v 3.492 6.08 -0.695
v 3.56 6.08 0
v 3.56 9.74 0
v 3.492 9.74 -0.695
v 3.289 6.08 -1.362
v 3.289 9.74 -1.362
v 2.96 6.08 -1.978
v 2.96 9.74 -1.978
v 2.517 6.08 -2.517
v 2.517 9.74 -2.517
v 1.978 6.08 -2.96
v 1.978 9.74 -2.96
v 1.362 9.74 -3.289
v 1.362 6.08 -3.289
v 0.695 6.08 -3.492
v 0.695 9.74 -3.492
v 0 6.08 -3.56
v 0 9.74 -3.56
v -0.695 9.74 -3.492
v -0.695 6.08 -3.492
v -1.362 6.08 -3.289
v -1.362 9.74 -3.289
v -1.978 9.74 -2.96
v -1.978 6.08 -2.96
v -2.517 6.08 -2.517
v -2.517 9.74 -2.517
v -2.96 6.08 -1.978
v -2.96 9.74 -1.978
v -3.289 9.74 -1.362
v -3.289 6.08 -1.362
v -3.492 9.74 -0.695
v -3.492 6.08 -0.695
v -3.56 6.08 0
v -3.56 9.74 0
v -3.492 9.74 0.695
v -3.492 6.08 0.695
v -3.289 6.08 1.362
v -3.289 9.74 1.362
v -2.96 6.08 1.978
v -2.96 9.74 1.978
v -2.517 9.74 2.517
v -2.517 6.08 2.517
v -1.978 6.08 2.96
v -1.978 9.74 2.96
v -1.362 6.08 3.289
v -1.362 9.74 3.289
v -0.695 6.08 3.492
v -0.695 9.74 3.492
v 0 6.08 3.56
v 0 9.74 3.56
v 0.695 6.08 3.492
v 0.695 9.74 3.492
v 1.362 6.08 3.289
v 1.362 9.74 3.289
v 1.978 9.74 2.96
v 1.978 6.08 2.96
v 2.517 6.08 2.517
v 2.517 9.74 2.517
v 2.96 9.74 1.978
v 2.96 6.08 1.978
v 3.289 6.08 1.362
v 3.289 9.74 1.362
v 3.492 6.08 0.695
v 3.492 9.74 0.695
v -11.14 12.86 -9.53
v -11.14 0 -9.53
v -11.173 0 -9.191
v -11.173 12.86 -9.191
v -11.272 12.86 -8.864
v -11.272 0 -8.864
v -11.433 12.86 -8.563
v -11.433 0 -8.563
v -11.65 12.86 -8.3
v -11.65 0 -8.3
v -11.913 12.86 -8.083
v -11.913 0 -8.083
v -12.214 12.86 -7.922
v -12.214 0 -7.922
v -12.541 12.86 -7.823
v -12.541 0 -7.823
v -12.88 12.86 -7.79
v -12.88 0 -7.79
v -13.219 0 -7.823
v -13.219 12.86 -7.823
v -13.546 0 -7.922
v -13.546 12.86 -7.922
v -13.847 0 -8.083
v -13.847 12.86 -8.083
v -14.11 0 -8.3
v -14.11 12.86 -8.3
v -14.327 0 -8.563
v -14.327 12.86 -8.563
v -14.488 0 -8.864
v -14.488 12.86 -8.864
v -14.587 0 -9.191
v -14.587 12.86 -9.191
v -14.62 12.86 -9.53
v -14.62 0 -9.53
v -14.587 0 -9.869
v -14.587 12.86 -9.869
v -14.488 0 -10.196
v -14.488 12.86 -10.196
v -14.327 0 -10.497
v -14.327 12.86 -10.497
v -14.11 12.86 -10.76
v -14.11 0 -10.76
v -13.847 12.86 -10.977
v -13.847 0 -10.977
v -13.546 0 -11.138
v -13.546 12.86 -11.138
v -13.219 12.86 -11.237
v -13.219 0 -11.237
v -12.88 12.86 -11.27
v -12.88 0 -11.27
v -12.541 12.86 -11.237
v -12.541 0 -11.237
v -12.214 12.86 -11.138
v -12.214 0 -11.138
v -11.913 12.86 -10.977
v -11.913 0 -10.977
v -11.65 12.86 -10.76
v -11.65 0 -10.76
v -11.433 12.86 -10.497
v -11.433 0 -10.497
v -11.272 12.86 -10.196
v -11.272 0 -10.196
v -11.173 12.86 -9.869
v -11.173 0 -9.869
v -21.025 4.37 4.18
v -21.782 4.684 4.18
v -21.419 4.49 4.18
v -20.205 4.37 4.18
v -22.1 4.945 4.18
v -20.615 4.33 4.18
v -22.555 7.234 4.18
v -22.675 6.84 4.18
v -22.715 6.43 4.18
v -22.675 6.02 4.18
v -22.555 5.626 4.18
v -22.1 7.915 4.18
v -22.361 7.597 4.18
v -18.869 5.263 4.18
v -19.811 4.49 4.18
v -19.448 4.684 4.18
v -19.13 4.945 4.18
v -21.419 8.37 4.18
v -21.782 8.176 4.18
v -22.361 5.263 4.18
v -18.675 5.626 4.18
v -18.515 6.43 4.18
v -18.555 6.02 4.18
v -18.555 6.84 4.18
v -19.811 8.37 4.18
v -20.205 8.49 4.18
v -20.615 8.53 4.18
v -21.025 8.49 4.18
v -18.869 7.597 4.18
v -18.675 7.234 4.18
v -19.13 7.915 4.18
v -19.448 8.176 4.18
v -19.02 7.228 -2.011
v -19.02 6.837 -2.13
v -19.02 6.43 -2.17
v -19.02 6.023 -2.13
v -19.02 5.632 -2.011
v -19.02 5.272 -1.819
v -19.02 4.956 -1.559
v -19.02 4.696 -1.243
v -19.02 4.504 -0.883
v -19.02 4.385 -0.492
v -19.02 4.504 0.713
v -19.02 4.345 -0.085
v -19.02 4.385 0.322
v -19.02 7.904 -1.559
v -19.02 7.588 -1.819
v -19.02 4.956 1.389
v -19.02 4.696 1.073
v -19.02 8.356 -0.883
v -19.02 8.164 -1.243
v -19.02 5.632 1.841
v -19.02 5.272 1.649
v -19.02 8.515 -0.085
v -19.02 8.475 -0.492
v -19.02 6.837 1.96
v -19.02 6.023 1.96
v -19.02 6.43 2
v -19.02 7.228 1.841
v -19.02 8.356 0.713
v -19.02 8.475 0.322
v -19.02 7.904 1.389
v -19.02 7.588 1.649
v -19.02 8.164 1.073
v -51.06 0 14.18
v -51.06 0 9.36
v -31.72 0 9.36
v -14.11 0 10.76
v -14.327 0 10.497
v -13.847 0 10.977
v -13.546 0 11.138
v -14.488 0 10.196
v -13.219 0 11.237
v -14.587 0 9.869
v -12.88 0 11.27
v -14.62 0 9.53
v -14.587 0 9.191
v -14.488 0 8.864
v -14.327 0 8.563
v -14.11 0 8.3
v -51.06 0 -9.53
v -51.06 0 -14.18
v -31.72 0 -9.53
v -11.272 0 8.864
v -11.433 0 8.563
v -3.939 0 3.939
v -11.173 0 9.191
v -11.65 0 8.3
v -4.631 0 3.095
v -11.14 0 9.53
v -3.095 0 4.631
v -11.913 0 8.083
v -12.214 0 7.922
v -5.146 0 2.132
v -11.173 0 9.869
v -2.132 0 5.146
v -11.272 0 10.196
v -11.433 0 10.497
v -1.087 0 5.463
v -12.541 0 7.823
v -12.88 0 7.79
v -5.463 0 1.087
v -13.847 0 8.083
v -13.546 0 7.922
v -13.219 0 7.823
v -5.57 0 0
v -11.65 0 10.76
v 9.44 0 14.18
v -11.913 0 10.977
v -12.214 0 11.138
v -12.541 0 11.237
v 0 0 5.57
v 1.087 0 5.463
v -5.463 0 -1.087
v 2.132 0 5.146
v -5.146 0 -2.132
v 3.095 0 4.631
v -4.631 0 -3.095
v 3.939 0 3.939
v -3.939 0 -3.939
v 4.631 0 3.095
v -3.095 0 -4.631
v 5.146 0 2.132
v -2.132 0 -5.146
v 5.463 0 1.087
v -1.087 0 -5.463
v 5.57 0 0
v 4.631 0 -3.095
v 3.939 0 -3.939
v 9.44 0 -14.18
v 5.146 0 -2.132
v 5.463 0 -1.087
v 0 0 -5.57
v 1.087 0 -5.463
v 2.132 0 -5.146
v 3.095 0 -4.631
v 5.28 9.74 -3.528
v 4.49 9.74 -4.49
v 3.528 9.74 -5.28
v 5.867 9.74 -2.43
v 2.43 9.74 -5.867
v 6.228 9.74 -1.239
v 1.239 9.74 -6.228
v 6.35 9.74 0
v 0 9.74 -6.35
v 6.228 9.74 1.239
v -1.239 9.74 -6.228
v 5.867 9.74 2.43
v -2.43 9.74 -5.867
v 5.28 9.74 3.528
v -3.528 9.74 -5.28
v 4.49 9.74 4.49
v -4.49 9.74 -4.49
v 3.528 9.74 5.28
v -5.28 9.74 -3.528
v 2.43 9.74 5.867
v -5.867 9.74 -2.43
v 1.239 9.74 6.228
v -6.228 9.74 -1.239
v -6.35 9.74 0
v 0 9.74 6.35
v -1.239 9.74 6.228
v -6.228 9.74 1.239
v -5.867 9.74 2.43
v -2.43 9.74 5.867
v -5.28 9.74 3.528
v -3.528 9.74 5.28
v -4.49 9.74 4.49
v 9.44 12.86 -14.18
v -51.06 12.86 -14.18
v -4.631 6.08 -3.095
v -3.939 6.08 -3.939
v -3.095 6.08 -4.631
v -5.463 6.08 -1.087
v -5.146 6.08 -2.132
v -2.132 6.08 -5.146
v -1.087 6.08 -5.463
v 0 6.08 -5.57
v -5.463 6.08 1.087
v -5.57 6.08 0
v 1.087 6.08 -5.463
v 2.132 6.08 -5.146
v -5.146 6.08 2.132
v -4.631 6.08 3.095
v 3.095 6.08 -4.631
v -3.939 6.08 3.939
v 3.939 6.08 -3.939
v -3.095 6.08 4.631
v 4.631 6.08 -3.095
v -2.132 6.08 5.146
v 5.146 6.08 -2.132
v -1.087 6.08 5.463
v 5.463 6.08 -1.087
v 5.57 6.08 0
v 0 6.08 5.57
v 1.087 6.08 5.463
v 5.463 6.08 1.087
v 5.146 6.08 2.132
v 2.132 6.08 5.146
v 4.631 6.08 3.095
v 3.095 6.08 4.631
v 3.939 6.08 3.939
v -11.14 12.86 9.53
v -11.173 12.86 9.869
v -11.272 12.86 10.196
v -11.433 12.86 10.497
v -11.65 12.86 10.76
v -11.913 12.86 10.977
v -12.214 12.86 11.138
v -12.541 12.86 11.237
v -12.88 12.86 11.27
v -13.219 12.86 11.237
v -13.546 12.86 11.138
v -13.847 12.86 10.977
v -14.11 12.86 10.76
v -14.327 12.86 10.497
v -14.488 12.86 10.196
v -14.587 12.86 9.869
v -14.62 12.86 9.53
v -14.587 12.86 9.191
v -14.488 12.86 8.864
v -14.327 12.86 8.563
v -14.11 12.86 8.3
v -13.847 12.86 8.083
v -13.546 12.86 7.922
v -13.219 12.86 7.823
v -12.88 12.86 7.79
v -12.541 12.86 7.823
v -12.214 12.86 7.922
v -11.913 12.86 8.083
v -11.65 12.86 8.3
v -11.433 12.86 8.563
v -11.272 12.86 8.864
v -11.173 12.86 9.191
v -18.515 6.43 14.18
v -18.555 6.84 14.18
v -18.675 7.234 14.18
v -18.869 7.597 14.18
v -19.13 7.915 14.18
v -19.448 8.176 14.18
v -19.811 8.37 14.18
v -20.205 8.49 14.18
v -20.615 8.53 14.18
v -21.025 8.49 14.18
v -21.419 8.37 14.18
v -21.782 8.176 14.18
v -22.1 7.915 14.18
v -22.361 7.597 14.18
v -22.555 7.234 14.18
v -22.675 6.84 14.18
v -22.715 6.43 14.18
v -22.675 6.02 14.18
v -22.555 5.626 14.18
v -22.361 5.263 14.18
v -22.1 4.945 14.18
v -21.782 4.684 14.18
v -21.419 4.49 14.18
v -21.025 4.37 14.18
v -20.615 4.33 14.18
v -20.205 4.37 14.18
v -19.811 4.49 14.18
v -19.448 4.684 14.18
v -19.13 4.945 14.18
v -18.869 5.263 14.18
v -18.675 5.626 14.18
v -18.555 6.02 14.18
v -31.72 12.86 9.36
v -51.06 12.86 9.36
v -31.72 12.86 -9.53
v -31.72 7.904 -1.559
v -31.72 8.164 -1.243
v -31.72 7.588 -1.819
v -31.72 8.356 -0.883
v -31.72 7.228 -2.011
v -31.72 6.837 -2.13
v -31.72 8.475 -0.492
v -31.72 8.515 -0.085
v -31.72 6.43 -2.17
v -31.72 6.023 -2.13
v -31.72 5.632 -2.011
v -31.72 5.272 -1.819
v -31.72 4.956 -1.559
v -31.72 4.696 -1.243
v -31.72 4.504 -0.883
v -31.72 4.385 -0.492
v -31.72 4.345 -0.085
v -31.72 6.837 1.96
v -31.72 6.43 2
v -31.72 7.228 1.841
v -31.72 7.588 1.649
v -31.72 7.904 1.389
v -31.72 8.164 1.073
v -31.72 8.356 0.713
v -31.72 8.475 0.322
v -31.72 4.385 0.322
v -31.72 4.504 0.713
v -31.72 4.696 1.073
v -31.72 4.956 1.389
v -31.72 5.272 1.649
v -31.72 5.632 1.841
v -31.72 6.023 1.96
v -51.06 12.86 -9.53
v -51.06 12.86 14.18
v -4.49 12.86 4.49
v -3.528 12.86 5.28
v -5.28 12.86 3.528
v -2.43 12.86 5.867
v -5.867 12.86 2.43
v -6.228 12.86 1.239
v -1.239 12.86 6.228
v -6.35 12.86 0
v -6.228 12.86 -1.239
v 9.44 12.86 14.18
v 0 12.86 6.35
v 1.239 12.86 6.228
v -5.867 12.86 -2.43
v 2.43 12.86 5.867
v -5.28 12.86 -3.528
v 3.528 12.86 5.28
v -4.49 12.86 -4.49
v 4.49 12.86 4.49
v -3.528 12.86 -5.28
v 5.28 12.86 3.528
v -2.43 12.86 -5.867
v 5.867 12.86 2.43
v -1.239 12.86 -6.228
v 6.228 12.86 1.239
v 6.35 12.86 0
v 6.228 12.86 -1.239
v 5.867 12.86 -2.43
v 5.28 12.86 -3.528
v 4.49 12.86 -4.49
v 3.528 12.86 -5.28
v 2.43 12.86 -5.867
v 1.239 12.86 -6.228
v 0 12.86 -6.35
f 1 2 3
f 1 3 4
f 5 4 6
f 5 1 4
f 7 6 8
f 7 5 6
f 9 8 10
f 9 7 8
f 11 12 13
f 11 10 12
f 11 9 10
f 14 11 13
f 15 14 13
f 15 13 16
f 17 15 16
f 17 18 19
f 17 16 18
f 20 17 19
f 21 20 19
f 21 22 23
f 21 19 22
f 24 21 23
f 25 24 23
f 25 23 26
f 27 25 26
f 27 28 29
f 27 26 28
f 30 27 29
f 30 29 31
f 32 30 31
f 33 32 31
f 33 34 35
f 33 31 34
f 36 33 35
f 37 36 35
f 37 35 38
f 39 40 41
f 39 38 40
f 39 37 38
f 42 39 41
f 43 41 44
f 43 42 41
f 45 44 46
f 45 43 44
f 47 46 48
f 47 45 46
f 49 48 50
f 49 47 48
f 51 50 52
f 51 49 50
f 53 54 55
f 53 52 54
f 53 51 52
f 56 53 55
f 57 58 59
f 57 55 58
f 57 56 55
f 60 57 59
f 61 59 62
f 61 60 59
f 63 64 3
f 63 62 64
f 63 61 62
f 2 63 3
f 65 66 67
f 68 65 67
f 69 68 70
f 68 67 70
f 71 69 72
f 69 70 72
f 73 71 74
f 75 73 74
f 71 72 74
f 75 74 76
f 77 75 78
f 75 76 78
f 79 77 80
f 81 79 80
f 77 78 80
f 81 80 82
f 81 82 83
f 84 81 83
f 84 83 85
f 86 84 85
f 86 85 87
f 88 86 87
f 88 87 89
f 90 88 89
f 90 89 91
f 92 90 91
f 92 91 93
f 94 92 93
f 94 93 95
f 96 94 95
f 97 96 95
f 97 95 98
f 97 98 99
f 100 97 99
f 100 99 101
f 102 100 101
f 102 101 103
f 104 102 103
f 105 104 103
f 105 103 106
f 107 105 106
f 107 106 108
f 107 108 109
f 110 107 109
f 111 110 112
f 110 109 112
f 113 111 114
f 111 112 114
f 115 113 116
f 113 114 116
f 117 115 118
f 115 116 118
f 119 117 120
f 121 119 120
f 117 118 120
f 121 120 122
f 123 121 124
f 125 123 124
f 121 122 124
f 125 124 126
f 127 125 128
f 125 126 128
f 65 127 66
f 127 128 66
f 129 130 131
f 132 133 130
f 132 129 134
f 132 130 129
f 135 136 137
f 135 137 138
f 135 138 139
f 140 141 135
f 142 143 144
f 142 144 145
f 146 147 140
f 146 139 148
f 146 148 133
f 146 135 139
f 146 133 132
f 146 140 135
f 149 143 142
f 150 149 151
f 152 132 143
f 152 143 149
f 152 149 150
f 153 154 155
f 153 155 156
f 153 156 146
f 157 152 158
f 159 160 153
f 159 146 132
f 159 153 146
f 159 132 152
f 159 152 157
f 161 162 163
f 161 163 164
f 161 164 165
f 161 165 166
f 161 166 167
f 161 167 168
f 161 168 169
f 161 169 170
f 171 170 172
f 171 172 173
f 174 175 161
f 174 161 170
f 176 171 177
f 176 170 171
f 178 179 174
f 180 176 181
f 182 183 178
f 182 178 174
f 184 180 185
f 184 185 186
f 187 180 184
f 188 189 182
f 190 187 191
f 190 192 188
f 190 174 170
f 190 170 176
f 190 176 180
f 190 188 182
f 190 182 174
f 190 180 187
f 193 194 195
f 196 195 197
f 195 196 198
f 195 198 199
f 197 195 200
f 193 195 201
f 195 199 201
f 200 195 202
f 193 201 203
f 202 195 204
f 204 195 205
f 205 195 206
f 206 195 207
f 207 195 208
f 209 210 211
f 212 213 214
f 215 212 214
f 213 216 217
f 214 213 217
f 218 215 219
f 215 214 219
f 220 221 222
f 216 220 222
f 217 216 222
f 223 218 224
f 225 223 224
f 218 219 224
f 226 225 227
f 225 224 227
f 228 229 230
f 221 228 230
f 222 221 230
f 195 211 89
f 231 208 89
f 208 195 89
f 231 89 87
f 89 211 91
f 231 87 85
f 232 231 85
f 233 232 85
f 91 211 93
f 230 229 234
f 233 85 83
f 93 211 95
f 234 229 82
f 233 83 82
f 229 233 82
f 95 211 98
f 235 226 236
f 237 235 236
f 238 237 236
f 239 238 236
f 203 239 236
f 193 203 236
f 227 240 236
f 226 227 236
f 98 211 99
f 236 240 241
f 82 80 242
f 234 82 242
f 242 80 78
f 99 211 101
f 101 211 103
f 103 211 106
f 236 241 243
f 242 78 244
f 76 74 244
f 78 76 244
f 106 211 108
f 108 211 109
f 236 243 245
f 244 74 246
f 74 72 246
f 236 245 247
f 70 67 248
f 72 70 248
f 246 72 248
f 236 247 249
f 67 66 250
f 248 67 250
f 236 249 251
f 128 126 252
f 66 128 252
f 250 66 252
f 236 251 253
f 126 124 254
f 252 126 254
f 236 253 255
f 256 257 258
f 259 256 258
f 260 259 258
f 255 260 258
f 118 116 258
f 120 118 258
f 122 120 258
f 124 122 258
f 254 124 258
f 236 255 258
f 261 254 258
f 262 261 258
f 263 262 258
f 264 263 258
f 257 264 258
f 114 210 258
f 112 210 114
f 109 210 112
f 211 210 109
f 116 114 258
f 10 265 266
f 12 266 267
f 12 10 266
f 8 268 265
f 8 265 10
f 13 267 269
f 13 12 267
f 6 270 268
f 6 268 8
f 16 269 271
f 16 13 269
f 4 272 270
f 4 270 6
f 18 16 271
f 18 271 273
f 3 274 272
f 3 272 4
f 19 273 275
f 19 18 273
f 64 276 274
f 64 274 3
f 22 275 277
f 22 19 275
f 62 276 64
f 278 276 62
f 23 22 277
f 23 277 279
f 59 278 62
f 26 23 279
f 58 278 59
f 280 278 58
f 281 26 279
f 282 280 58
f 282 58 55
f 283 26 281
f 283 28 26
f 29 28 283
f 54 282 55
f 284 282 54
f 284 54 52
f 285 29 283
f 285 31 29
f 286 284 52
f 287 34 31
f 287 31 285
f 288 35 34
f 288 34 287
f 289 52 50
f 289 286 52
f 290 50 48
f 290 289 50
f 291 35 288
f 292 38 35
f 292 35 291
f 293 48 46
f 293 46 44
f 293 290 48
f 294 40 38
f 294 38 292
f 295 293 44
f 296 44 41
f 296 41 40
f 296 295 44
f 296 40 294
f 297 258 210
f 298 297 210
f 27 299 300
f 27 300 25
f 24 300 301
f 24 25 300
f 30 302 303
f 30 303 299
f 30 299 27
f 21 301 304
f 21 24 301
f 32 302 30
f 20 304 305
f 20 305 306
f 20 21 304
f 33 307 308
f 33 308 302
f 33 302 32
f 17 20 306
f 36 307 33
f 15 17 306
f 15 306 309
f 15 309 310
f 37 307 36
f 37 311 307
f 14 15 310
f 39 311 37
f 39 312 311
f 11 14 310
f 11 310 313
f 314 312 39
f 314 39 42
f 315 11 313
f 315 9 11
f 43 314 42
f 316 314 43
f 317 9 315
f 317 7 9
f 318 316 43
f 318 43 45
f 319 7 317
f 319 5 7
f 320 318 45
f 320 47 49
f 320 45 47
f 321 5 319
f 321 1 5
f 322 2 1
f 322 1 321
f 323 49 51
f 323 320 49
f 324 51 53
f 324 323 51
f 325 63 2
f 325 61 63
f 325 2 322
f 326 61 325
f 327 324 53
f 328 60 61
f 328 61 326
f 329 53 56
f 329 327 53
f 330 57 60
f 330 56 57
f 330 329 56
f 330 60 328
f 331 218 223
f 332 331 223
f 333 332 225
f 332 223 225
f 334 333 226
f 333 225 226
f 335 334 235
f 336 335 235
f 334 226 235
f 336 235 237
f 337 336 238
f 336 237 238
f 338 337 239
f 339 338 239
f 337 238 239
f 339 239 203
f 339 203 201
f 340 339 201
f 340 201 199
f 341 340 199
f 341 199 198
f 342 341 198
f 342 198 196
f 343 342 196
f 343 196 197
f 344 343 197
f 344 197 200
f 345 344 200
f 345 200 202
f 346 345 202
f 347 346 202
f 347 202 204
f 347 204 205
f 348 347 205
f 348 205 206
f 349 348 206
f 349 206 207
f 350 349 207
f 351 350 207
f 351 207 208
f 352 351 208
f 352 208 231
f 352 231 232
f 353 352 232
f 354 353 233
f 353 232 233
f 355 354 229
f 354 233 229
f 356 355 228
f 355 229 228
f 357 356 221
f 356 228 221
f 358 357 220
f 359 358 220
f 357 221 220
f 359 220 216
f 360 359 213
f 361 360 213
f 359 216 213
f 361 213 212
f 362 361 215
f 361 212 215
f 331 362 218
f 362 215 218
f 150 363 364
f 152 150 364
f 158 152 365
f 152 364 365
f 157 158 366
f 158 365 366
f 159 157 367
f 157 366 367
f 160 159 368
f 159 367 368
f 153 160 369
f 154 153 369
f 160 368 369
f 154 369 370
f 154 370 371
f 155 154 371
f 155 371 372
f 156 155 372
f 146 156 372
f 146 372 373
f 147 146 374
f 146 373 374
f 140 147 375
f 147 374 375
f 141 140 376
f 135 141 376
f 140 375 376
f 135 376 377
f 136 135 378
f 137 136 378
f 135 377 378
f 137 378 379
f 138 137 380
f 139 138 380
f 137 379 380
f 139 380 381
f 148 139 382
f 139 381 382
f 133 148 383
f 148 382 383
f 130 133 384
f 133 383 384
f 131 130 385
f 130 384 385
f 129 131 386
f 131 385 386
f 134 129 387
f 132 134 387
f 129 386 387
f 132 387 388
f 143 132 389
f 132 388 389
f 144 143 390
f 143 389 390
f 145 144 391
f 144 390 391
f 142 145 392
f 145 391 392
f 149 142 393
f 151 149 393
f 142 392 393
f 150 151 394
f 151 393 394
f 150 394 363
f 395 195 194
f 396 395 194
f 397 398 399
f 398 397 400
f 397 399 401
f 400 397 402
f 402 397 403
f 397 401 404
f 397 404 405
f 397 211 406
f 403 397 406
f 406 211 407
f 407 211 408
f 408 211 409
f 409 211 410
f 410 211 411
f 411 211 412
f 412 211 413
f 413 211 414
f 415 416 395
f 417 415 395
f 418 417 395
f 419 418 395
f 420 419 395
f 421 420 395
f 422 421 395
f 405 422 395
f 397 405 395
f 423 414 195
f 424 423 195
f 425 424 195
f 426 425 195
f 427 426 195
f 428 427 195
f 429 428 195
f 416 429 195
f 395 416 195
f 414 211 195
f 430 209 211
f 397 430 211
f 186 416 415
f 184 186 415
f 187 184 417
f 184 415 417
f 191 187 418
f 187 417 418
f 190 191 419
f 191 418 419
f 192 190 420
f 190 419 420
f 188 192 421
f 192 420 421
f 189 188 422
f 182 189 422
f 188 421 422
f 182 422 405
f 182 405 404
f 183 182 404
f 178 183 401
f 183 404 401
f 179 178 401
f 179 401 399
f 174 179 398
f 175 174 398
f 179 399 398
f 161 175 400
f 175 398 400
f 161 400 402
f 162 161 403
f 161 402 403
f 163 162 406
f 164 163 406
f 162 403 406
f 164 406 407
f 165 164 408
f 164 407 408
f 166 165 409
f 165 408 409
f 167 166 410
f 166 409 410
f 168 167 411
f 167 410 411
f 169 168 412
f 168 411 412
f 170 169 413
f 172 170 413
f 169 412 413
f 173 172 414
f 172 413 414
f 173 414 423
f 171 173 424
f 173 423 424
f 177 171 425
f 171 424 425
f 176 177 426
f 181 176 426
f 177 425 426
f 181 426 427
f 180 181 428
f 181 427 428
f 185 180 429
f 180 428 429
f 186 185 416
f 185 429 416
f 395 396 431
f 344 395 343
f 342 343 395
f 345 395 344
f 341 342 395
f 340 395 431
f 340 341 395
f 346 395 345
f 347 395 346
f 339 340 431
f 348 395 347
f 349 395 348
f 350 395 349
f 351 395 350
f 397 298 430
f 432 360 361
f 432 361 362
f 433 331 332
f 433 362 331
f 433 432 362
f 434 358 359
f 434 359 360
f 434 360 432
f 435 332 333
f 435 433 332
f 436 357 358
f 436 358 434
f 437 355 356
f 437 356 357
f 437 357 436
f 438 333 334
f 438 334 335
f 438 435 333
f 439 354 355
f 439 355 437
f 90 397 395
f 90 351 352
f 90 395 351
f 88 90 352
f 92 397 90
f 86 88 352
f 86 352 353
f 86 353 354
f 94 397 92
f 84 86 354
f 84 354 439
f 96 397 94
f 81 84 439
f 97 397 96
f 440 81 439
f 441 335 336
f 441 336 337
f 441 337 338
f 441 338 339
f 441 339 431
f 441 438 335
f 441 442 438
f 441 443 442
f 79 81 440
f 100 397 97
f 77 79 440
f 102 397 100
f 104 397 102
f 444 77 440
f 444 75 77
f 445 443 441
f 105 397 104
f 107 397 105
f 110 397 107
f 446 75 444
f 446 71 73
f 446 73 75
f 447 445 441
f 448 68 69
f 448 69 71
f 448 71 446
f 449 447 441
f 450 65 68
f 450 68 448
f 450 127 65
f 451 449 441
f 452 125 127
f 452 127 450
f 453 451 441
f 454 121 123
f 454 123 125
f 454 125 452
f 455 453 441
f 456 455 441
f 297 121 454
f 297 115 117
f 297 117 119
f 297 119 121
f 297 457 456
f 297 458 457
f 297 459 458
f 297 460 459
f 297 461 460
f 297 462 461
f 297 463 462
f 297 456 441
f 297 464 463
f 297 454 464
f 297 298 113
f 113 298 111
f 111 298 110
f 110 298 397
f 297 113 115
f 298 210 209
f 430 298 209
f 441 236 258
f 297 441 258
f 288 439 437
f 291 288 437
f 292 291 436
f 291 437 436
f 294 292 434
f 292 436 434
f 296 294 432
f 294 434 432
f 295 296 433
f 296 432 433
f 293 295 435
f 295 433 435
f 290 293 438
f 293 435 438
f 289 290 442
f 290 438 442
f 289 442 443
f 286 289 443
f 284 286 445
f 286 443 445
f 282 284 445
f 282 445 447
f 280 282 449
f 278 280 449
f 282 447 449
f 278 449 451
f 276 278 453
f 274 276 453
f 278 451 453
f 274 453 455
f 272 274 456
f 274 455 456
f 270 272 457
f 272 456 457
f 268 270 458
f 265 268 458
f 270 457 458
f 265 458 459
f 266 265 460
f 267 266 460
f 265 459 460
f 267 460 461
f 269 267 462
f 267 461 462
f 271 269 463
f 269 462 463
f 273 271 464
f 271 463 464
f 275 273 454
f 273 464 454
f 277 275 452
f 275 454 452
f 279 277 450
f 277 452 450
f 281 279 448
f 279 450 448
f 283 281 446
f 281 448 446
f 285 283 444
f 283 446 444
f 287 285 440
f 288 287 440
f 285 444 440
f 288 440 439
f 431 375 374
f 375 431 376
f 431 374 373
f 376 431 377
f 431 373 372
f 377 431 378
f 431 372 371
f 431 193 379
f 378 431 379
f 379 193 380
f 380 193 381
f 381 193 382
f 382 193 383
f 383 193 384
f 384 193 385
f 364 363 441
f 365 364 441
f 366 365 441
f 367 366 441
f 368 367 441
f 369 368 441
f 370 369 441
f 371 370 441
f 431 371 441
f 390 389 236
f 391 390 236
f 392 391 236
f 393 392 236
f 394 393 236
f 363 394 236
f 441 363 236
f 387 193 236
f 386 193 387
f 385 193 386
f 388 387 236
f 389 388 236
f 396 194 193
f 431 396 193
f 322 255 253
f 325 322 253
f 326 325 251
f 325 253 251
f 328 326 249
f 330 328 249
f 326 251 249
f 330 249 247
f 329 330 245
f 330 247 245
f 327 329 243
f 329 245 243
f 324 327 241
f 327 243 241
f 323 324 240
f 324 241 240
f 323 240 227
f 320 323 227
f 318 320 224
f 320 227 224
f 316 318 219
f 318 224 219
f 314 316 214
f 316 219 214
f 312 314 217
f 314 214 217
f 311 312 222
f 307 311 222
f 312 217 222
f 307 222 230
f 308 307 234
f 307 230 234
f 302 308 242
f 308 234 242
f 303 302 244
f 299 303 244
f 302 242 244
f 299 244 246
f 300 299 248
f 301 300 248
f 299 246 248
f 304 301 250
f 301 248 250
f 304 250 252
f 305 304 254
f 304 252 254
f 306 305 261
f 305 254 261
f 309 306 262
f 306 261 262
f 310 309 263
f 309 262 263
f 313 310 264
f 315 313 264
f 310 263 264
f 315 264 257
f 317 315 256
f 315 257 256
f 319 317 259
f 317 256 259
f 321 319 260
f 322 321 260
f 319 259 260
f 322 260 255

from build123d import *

# Parameters (mm, degrees)
SKETCH1_R              = 3.56
BOSS_EXTRUDE1_DEPTH    = 12.86
SKETCH2_R              = 2.085
CUT_EXTRUDE1_DEPTH     = 12.7
SKETCH3_R              = 6.35
CUT_EXTRUDE2_DEPTH     = 3.12
SKETCH4_R              = 5.57
CUT_EXTRUDE3_DEPTH     = 6.08
SKETCH5_R              = 1.74
CUT_EXTRUDE4_DEPTH     = 13.86
SKETCH6_R              = 1.735
CUT_EXTRUDE_8_32_DEPTH = 5
SKETCH7_R              = 2.1
CUT_EXTRUDE5_DEPTH     = 10


with BuildPart() as part:
    # Sketch1 → Boss-Extrude1 (new body)
    with BuildSketch(Plane(origin=(0, 0, 0), x_dir=(1, 0, 0), z_dir=(0, 1, 0))):
        Polygon((-31.72, 9.53), (-31.72, -9.36), (-51.06, -9.36), (-51.06, -14.18), (9.44, -14.18), (9.44, 14.18), (-51.06, 14.18), (-51.06, 9.53), align=None)
        Circle(SKETCH1_R, mode=Mode.SUBTRACT)
    extrude(amount=BOSS_EXTRUDE1_DEPTH)

    # Sketch2 → Cut-Extrude1 (cut)
    with BuildSketch(Plane.ZY.offset(31.72)):
        with Locations((-0.085, 6.43)):
            Circle(SKETCH2_R)
    extrude(amount=-CUT_EXTRUDE1_DEPTH, mode=Mode.SUBTRACT)

    # Sketch3 → Cut-Extrude2 (cut)
    with BuildSketch(Plane(origin=(0, 12.86, 0), x_dir=(-1, 0, 0), z_dir=(0, 1, 0))):
        Circle(SKETCH3_R)
    extrude(amount=-CUT_EXTRUDE2_DEPTH, mode=Mode.SUBTRACT)

    # Sketch4 → Cut-Extrude3 (cut)
    with BuildSketch(Plane.XZ):
        Circle(SKETCH4_R)
    extrude(amount=-CUT_EXTRUDE3_DEPTH, mode=Mode.SUBTRACT)

    # Sketch5 → Cut-Extrude4 (cut, through all)
    with BuildSketch(Plane.XZ):
        with Locations((-12.88, -9.53)):
            Circle(SKETCH5_R)
        with Locations((-12.88, 9.53)):
            Circle(SKETCH5_R)
    extrude(amount=-CUT_EXTRUDE4_DEPTH, mode=Mode.SUBTRACT)

    # Sketch6 → Cut-Extrude 8-32 (cut)
    with BuildSketch(Plane.XY.offset(14.18)):
        with Locations((-20.615, 6.43)):
            Circle(SKETCH6_R)
    extrude(amount=-CUT_EXTRUDE_8_32_DEPTH, mode=Mode.SUBTRACT)

    # Sketch7 → Cut-Extrude5 (cut)
    with BuildSketch(Plane.XY.offset(14.18)):
        with Locations((-20.615, 6.43)):
            Circle(SKETCH7_R)
    extrude(amount=-CUT_EXTRUDE5_DEPTH, mode=Mode.SUBTRACT)


solid = part.part
